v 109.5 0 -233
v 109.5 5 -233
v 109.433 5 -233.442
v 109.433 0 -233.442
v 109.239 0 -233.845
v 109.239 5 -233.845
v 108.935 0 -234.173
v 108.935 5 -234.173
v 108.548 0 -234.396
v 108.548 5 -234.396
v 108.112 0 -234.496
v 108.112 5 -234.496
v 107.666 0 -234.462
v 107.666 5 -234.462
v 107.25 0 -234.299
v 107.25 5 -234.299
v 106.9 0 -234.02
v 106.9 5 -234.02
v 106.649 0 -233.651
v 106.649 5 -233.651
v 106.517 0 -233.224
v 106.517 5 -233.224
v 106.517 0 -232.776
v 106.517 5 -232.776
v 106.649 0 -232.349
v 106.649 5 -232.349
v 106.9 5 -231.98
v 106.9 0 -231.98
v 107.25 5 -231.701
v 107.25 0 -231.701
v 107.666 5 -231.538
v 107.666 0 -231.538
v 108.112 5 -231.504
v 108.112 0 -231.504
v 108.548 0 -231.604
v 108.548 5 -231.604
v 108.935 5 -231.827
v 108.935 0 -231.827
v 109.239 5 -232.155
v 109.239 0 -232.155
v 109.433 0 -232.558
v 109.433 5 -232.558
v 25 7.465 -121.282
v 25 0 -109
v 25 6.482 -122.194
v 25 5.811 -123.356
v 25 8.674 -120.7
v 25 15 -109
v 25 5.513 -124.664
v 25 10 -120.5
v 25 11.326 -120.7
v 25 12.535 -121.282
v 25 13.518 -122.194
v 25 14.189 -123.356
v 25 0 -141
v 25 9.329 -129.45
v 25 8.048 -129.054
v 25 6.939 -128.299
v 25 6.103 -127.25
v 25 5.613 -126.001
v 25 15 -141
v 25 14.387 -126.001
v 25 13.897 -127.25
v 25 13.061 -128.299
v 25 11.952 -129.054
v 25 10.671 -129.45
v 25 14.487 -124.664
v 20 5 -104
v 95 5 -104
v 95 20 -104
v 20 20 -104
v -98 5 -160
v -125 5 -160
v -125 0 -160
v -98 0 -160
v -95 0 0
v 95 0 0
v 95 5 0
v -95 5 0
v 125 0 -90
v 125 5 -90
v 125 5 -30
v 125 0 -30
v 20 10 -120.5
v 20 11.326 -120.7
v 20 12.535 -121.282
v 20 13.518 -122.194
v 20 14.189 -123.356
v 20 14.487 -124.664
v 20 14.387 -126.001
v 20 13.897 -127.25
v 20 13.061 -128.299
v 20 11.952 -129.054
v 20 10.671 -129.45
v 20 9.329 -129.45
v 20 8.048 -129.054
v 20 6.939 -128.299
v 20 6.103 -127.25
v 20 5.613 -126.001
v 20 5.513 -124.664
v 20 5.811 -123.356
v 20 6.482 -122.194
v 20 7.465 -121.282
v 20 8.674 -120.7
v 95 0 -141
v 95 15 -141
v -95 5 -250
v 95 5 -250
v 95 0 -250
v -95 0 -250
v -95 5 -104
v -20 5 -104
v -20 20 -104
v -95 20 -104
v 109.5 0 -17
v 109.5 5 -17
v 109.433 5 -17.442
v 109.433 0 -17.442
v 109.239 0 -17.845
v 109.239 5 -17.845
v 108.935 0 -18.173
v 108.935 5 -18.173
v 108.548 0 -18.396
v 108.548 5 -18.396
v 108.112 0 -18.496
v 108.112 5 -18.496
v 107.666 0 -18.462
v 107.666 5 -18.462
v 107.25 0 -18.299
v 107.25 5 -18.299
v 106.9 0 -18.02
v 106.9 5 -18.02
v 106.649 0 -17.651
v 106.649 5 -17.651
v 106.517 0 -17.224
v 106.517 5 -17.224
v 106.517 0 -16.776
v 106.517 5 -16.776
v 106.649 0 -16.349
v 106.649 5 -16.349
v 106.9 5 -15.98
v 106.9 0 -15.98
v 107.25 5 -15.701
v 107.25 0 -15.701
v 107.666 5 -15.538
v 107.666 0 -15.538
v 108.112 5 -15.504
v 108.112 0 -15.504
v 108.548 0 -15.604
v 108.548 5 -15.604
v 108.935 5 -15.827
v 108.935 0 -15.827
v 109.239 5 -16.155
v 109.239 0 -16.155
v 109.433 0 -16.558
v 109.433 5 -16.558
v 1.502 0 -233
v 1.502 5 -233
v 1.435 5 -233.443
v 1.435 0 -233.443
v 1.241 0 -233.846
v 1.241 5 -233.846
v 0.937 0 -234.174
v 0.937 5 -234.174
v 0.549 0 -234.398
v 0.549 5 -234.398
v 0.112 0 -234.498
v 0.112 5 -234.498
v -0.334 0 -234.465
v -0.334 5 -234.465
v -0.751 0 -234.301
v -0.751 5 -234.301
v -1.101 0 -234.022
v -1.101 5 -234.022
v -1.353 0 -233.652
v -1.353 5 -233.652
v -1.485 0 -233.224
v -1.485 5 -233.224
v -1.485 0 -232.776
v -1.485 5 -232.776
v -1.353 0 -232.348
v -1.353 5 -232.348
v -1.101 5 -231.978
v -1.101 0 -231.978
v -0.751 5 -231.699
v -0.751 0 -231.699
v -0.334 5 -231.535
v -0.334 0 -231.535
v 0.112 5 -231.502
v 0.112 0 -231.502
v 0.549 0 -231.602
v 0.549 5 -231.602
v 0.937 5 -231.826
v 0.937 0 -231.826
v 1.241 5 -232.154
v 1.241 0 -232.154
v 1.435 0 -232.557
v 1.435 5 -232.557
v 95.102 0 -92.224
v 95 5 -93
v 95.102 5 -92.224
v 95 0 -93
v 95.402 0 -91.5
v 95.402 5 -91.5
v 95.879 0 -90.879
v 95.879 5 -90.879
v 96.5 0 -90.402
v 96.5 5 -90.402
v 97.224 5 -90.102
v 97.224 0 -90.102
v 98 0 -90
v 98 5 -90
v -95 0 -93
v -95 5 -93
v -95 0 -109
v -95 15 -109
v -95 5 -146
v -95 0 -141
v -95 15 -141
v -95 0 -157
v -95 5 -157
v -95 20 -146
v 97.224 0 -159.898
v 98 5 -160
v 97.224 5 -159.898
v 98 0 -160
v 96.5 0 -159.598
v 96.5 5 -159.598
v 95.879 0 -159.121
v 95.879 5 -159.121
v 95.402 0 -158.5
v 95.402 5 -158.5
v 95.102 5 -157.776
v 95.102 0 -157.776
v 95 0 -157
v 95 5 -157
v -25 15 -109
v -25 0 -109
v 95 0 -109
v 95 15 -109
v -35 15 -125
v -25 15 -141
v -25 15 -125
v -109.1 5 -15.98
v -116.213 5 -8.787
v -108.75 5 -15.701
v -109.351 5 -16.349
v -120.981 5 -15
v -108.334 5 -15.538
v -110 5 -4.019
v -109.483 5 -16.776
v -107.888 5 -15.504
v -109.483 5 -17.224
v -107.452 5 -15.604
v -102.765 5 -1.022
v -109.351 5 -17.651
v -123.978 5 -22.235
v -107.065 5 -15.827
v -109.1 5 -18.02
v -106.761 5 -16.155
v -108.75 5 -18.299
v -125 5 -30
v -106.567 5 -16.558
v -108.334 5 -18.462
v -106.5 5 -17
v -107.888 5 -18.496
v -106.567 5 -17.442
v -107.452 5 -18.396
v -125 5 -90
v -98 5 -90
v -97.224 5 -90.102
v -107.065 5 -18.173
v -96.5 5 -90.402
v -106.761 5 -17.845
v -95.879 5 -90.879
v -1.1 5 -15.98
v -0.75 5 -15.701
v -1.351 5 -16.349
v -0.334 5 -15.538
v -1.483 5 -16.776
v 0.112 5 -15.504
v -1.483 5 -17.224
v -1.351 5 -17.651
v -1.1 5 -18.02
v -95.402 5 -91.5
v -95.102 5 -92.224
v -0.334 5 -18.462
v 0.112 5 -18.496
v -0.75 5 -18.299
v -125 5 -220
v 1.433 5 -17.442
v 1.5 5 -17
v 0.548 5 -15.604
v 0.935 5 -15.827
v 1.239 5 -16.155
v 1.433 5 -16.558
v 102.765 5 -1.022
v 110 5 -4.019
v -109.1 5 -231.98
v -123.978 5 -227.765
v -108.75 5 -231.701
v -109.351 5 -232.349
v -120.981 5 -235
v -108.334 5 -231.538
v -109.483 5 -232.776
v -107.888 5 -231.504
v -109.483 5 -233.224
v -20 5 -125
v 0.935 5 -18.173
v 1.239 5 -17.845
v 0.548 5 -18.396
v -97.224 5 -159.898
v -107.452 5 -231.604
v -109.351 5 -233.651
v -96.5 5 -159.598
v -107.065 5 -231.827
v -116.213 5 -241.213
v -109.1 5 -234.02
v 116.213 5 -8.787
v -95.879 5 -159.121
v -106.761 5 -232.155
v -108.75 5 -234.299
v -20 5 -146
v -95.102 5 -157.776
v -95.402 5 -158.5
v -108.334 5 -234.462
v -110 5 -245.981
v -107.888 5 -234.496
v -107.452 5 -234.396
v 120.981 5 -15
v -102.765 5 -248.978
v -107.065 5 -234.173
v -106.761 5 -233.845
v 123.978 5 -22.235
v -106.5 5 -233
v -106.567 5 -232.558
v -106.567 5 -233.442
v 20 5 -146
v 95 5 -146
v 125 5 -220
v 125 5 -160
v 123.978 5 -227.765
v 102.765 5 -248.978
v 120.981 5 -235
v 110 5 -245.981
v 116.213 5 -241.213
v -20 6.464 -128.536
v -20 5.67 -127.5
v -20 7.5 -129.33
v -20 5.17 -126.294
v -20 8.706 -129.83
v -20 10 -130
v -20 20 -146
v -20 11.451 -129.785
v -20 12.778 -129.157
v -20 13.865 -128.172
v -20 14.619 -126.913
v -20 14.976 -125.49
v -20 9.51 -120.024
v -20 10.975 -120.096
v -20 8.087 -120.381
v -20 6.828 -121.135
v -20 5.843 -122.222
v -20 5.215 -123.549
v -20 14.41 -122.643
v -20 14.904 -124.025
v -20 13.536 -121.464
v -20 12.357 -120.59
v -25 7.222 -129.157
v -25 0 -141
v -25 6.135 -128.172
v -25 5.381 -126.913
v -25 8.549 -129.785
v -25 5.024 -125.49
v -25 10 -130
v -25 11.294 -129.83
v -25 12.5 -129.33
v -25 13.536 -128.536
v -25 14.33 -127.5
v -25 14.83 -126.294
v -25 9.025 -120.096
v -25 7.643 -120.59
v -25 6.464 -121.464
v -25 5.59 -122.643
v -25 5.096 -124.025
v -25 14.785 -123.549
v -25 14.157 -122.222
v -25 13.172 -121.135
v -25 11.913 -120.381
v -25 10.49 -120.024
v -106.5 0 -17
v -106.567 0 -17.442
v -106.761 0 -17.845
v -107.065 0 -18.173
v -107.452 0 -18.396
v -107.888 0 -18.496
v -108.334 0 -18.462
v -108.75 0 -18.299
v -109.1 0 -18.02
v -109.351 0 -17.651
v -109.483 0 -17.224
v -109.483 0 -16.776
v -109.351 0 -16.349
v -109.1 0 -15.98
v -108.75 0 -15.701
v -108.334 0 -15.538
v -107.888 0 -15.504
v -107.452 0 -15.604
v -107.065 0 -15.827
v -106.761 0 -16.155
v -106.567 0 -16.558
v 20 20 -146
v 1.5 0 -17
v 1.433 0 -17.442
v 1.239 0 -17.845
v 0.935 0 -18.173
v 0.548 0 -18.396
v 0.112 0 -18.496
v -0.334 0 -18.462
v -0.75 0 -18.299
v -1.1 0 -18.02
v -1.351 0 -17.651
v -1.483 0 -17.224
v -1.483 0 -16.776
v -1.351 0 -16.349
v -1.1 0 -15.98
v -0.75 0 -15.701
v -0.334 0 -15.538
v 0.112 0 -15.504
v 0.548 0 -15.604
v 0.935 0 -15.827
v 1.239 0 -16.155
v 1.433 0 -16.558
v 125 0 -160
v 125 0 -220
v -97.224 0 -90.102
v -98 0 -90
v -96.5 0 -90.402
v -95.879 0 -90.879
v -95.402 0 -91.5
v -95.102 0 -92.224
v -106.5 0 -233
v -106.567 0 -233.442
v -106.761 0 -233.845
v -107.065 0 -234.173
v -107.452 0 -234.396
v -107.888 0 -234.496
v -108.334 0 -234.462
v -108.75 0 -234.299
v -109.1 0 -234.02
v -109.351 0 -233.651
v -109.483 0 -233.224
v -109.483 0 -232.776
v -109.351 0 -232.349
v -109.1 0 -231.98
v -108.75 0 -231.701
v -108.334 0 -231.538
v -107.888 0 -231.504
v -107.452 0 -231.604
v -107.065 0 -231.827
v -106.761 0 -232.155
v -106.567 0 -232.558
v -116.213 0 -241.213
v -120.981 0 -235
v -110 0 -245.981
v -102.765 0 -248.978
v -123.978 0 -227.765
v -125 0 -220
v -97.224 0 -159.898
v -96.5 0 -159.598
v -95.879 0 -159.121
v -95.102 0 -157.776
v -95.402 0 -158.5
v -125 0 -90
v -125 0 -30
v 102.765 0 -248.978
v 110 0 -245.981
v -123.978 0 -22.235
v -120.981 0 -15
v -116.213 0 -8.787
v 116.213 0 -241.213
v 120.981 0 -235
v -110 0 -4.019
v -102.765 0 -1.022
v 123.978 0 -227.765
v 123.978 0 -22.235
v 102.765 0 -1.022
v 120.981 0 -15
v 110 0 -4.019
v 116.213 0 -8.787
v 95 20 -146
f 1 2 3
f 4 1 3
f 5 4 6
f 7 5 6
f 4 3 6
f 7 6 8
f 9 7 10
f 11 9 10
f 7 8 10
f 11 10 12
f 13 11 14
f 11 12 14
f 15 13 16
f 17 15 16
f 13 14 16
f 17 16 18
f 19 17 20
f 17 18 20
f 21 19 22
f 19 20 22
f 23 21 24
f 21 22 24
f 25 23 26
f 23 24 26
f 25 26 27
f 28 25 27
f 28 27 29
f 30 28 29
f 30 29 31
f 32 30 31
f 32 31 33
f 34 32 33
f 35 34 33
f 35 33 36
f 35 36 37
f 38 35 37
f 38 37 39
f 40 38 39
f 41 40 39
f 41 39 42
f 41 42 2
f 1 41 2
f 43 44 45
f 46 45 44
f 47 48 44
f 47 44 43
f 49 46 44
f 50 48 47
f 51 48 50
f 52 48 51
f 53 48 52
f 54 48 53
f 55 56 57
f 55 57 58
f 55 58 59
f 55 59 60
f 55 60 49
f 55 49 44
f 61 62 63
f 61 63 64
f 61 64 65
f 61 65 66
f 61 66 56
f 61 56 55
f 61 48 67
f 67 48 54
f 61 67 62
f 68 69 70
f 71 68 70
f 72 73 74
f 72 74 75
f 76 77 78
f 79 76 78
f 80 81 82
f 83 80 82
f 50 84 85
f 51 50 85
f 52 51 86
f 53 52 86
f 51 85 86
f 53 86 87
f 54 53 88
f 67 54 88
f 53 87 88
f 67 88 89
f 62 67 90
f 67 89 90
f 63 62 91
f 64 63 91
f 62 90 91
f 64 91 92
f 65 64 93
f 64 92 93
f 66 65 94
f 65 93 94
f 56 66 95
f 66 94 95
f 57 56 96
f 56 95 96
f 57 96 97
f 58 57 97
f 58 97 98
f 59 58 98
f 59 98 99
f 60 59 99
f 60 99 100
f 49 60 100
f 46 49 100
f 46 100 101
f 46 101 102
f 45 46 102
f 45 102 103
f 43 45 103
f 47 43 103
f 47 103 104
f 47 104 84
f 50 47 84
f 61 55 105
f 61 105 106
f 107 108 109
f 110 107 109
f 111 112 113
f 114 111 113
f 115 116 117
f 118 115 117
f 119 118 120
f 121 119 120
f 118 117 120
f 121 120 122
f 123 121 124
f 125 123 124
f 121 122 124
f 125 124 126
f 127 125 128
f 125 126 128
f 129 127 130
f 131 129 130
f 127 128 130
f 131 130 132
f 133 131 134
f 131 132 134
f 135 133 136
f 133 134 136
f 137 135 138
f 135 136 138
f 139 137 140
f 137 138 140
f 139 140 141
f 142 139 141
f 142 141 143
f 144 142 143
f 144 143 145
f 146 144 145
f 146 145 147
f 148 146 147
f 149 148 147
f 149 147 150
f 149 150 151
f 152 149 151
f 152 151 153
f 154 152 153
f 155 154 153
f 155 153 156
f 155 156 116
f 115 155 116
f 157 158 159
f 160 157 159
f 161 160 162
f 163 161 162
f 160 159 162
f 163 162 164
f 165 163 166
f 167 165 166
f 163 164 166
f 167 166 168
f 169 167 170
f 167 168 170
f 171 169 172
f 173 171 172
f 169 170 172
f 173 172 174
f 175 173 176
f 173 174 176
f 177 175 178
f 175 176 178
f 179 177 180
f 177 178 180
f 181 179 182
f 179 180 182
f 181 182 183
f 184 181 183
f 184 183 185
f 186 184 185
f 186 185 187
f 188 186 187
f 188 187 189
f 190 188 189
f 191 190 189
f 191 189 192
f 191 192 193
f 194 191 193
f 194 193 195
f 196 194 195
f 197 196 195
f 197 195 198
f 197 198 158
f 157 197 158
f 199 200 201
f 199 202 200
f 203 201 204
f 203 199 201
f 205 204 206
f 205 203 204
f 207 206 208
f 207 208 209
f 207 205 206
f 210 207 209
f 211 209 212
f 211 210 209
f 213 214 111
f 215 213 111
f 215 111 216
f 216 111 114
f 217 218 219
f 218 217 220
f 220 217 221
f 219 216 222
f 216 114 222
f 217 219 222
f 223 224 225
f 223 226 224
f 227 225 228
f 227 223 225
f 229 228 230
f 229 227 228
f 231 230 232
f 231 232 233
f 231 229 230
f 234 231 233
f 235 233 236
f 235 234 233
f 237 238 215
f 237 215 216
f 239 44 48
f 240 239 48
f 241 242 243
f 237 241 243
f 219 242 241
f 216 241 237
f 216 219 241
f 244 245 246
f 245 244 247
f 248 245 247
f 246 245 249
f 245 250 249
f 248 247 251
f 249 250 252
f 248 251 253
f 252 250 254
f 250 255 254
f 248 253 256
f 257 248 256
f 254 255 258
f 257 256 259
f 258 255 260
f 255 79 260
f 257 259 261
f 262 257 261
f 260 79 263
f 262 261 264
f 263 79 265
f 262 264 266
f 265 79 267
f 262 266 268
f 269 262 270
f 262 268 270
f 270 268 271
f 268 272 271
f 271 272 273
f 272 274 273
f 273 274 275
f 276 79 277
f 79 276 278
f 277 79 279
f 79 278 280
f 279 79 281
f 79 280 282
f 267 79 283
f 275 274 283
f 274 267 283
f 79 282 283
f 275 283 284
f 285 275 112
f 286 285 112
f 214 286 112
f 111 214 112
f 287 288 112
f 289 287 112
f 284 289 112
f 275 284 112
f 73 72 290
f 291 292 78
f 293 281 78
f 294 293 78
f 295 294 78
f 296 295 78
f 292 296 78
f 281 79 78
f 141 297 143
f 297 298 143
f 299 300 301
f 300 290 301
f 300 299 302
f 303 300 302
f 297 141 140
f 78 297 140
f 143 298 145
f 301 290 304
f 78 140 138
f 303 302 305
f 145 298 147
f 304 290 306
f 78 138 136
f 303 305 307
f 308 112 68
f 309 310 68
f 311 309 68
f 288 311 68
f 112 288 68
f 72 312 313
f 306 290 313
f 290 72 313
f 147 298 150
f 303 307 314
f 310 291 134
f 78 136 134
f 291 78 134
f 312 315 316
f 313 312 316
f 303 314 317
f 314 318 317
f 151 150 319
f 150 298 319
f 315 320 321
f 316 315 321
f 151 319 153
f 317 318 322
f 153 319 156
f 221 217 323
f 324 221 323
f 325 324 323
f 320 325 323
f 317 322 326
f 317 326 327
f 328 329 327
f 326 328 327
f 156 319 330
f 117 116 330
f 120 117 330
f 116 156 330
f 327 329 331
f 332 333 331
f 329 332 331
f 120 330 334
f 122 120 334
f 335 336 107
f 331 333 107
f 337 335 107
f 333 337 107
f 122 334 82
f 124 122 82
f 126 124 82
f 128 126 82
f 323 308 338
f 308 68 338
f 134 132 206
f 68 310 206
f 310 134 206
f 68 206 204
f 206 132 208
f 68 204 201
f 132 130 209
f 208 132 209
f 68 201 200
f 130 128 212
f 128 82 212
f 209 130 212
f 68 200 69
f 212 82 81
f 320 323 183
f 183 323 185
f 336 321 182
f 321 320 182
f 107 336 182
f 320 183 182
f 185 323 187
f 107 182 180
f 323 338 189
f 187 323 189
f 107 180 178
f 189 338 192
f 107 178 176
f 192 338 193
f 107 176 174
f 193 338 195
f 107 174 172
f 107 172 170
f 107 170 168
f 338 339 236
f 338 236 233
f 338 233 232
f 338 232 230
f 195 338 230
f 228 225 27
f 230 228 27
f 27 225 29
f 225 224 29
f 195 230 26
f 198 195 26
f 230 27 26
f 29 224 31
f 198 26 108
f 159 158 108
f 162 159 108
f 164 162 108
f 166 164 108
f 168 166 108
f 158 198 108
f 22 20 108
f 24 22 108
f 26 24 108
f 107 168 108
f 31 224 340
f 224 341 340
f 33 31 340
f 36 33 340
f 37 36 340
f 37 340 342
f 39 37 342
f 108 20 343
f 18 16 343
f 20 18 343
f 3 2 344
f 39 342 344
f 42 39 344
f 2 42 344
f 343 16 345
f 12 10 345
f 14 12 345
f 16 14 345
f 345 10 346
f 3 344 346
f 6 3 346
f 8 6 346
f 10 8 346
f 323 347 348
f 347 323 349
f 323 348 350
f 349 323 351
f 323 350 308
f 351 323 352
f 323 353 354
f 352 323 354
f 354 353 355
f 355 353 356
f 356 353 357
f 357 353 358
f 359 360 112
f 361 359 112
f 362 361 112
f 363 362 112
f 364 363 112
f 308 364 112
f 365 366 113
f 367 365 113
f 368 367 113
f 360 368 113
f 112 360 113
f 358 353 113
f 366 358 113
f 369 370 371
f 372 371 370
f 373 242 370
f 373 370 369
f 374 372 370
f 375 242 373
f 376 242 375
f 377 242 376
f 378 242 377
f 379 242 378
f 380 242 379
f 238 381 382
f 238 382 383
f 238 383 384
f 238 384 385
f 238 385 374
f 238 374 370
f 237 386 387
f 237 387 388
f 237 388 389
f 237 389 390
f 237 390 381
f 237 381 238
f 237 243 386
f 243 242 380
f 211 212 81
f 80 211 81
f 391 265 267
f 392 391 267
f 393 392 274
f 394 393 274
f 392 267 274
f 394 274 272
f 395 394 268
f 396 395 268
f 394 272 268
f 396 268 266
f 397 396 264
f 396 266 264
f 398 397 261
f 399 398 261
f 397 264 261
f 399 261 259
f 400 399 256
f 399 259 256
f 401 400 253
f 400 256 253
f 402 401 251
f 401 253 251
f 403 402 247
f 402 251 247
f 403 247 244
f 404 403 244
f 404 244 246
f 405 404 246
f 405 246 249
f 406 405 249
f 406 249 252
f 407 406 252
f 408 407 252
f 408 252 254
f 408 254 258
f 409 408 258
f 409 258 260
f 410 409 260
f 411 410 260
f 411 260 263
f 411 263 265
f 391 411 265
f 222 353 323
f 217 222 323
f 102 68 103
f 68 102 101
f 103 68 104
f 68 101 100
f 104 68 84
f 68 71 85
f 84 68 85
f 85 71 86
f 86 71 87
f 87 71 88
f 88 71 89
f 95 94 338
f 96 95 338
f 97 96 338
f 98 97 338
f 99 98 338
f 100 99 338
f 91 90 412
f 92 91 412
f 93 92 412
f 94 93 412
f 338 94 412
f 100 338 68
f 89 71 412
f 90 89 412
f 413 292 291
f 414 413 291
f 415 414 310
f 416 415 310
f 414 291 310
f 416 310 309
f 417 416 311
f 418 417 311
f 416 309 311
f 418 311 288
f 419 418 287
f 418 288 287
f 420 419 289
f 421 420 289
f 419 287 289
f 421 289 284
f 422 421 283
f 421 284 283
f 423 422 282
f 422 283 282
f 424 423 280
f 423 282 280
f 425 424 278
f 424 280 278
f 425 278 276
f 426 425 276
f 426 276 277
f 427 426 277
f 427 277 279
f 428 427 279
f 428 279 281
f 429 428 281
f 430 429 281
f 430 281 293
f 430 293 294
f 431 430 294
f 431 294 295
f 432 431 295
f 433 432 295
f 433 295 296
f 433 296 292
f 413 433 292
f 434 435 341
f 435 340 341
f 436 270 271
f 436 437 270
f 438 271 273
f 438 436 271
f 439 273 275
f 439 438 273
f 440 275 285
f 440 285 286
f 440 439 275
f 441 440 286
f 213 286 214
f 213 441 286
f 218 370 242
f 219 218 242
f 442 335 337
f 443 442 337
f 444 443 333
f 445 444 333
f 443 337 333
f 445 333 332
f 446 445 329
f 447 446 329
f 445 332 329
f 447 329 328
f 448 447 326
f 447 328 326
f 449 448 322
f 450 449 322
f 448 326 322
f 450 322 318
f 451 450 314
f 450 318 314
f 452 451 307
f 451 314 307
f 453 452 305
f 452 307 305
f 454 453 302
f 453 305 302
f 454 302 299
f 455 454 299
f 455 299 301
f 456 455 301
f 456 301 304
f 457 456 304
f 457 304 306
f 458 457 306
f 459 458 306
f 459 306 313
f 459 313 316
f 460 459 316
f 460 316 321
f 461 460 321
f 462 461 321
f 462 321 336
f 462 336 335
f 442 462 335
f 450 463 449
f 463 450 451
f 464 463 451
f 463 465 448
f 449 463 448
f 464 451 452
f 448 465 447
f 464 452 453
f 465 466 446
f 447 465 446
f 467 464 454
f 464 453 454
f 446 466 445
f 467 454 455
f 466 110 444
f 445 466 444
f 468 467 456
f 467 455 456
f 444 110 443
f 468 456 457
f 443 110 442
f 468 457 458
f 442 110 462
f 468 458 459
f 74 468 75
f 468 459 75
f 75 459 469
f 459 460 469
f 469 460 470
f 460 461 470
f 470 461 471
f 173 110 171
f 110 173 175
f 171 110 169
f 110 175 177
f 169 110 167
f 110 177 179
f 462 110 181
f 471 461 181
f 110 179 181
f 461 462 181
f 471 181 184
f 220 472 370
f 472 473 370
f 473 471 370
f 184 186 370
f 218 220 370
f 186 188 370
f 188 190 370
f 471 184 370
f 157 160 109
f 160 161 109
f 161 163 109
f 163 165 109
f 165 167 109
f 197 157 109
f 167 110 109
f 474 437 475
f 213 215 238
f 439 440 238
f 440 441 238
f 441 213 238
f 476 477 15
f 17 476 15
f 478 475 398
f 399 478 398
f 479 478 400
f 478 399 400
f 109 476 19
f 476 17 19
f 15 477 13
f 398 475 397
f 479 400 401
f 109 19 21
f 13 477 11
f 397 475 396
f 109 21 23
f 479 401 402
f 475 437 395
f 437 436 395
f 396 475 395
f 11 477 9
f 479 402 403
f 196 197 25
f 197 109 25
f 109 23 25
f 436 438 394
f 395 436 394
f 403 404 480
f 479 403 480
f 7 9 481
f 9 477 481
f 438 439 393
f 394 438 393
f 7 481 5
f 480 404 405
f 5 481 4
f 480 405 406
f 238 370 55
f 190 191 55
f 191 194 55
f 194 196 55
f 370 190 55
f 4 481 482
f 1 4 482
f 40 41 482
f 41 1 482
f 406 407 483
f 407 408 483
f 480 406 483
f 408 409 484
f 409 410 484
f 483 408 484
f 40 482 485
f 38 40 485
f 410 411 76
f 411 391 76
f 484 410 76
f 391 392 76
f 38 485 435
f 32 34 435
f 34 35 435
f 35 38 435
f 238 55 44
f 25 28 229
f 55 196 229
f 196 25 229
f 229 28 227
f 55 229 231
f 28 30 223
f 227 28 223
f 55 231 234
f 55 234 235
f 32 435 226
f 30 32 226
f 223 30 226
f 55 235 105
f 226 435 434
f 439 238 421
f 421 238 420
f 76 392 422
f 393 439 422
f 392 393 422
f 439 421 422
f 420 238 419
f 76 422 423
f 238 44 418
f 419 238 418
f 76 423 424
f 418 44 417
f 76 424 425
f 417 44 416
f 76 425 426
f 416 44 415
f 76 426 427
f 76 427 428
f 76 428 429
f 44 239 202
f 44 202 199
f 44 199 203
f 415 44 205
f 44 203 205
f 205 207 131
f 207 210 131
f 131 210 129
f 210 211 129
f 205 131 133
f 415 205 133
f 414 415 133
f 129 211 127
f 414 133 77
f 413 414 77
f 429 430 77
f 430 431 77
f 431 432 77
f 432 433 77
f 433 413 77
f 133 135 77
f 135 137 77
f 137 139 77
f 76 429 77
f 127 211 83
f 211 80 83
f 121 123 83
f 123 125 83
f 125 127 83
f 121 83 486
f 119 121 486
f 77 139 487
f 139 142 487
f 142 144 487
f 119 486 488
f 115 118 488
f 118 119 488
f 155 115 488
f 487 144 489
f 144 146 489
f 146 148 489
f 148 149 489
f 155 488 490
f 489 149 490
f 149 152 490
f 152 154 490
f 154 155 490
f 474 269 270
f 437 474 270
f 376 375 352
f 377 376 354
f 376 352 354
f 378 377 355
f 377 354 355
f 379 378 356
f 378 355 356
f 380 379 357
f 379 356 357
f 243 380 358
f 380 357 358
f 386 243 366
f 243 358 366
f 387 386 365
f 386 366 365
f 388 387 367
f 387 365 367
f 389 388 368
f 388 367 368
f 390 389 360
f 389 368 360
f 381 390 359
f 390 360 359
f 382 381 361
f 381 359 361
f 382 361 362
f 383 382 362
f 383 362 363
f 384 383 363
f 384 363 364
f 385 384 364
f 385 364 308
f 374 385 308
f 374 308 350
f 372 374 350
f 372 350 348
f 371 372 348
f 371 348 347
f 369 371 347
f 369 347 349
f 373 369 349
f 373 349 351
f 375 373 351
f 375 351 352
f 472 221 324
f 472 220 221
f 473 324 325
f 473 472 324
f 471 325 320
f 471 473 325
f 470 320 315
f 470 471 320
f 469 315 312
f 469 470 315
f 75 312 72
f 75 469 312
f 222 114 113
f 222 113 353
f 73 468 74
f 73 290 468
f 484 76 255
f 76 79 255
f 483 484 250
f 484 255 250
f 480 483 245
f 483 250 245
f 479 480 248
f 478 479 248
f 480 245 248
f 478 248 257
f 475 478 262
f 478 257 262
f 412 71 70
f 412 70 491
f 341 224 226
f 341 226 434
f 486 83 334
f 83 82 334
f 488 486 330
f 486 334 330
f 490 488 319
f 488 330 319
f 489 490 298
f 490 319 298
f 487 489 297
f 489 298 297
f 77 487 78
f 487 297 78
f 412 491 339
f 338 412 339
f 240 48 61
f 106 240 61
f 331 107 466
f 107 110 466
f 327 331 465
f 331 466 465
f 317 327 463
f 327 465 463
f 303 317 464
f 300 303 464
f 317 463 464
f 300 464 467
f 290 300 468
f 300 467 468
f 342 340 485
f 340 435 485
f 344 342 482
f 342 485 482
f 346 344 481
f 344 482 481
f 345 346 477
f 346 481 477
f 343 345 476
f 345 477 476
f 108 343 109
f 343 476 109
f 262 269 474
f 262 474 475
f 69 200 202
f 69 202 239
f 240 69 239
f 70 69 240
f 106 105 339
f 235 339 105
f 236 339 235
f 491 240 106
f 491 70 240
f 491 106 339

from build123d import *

# Parameters (mm, degrees)
BOSS_EXTRUDE1_DEPTH = 125
SKETCH4_W           = 32
SKETCH4_H           = 15
CUT_EXTRUDE1_DEPTH  = 100
SKETCH5_W           = 32
SKETCH5_H           = 15
CUT_EXTRUDE2_DEPTH  = 100
CUT_EXTRUDE3_REACH  = 22
SKETCH6_W           = 30
SKETCH6_H           = 70
CUT_EXTRUDE4_DEPTH  = 15
SKETCH8_R           = 4.5
CUT_EXTRUDE5_DEPTH  = 15
SKETCH9_R           = 5
CUT_EXTRUDE6_DEPTH  = 15
FILLET1_R           = 3
FILLET2_R           = 30
CUT_EXTRUDE7_REACH  = 7
SKETCH11_R          = 1.5
SKETCH11_R_2        = 1.502187573


with BuildPart() as part:
    # Sketch3 → Boss-Extrude1 (new body, symmetric)
    with BuildSketch(Plane(origin=(0, 0, 0), x_dir=(0, 0, -1), z_dir=(1, 0, 0))):
        Polygon((0, 0), (0, 5), (104, 5), (104, 20), (146, 20), (146, 5), (250, 5), (250, 0), align=None)
    extrude(amount=BOSS_EXTRUDE1_DEPTH, both=True)

    # Sketch4 → Cut-Extrude1 (cut)
    with BuildSketch(Plane(origin=(125, 0, 0), x_dir=(0, 0, -1), z_dir=(1, 0, 0))):
        with Locations((125, 7.5)):
            Rectangle(SKETCH4_W, SKETCH4_H)
    extrude(amount=-CUT_EXTRUDE1_DEPTH, mode=Mode.SUBTRACT)

    # Sketch5 → Cut-Extrude2 (cut)
    with BuildSketch(Plane.ZY.offset(125)):
        with Locations((-125, 7.5)):
            Rectangle(SKETCH5_W, SKETCH5_H)
    extrude(amount=-CUT_EXTRUDE2_DEPTH, mode=Mode.SUBTRACT)

    # Sketch6 → Cut-Extrude3 (cut, up to next)
    with BuildSketch(Plane(origin=(0, 20, 0), x_dir=(1, 0, 0), z_dir=(0, 1, 0)), mode=Mode.PRIVATE) as cut_extrude3_sk1:
        with Locations((-110, 125)):
            Rectangle(SKETCH6_W, SKETCH6_H)
    cut_extrude3_tool1 = extrude(cut_extrude3_sk1.sketch, amount=-CUT_EXTRUDE3_REACH, mode=Mode.PRIVATE) & part.part
    add(cut_extrude3_tool1.solids().sort_by_distance((-110, 20, -125))[0], mode=Mode.SUBTRACT)
    # Sketch6 → Cut-Extrude3 (cut, up to next)
    with BuildSketch(Plane(origin=(0, 20, 0), x_dir=(1, 0, 0), z_dir=(0, 1, 0)), mode=Mode.PRIVATE) as cut_extrude3_sk2:
        with Locations((110, 125)):
            Rectangle(SKETCH6_W, SKETCH6_H)
    cut_extrude3_tool2 = extrude(cut_extrude3_sk2.sketch, amount=-CUT_EXTRUDE3_REACH, mode=Mode.PRIVATE) & part.part
    add(cut_extrude3_tool2.solids().sort_by_distance((110, 20, -125))[0], mode=Mode.SUBTRACT)

    # Sketch7 → Cut-Extrude4 (cut)
    with BuildSketch(Plane(origin=(0, 20, 0), x_dir=(1, 0, 0), z_dir=(0, 1, 0))):
        Polygon((0, 146), (-20, 146), (-20, 104), (0, 104), (20, 104), (20, 146), align=None)
    extrude(amount=-CUT_EXTRUDE4_DEPTH, mode=Mode.SUBTRACT)

    # Sketch8 → Cut-Extrude5 (cut)
    with BuildSketch(Plane.ZY.offset(-20)):
        with Locations((-125, 10)):
            Circle(SKETCH8_R)
    extrude(amount=-CUT_EXTRUDE5_DEPTH, mode=Mode.SUBTRACT)

    # Sketch9 → Cut-Extrude6 (cut)
    with BuildSketch(Plane(origin=(-20, 0, 0), x_dir=(0, 0, -1), z_dir=(1, 0, 0))):
        with Locations((125, 10)):
            Circle(SKETCH9_R)
    extrude(amount=-CUT_EXTRUDE6_DEPTH, mode=Mode.SUBTRACT)

    # Fillet1
    fillet1_edges = [part.edges().sort_by_distance(p)[0] for p in [
        (-95, 2.5, -90),
        (-95, 2.5, -160),
        (95, 2.5, -160),
        (95, 2.5, -90),
    ]]
    fillet(fillet1_edges, radius=FILLET1_R)

    # Fillet2
    fillet2_edges = [part.edges().sort_by_distance(p)[0] for p in [
        (-125, 2.5, -250),
        (125, 2.5, 0),
        (-125, 2.5, 0),
        (125, 2.5, -250),
    ]]
    fillet(fillet2_edges, radius=FILLET2_R)

    # Sketch11 → Cut-Extrude7 (cut, up to next)
    with BuildSketch(Plane(origin=(0, 5, 0), x_dir=(1, 0, 0), z_dir=(0, 1, 0)), mode=Mode.PRIVATE) as cut_extrude7_sk1:
        with Locations((-108, 233)):
            Circle(SKETCH11_R)
    cut_extrude7_tool1 = extrude(cut_extrude7_sk1.sketch, amount=-CUT_EXTRUDE7_REACH, mode=Mode.PRIVATE) & part.part
    add(cut_extrude7_tool1.solids().sort_by_distance((-108, 5, -233))[0], mode=Mode.SUBTRACT)
    # Sketch11 → Cut-Extrude7 (cut, up to next)
    with BuildSketch(Plane(origin=(0, 5, 0), x_dir=(1, 0, 0), z_dir=(0, 1, 0)), mode=Mode.PRIVATE) as cut_extrude7_sk2:
        with Locations((108, 233)):
            Circle(SKETCH11_R)
    cut_extrude7_tool2 = extrude(cut_extrude7_sk2.sketch, amount=-CUT_EXTRUDE7_REACH, mode=Mode.PRIVATE) & part.part
    add(cut_extrude7_tool2.solids().sort_by_distance((108, 5, -233))[0], mode=Mode.SUBTRACT)
    # Sketch11 → Cut-Extrude7 (cut, up to next)
    with BuildSketch(Plane(origin=(0, 5, 0), x_dir=(1, 0, 0), z_dir=(0, 1, 0)), mode=Mode.PRIVATE) as cut_extrude7_sk3:
        with Locations((108, 17)):
            Circle(SKETCH11_R)
    cut_extrude7_tool3 = extrude(cut_extrude7_sk3.sketch, amount=-CUT_EXTRUDE7_REACH, mode=Mode.PRIVATE) & part.part
    add(cut_extrude7_tool3.solids().sort_by_distance((108, 5, -17))[0], mode=Mode.SUBTRACT)
    # Sketch11 → Cut-Extrude7 (cut, up to next)
    with BuildSketch(Plane(origin=(0, 5, 0), x_dir=(1, 0, 0), z_dir=(0, 1, 0)), mode=Mode.PRIVATE) as cut_extrude7_sk4:
        with Locations((-108, 17)):
            Circle(SKETCH11_R)
    cut_extrude7_tool4 = extrude(cut_extrude7_sk4.sketch, amount=-CUT_EXTRUDE7_REACH, mode=Mode.PRIVATE) & part.part
    add(cut_extrude7_tool4.solids().sort_by_distance((-108, 5, -17))[0], mode=Mode.SUBTRACT)
    # Sketch11 → Cut-Extrude7 (cut, up to next)
    with BuildSketch(Plane(origin=(0, 5, 0), x_dir=(1, 0, 0), z_dir=(0, 1, 0)), mode=Mode.PRIVATE) as cut_extrude7_sk5:
        with Locations((0, 17)):
            Circle(SKETCH11_R)
    cut_extrude7_tool5 = extrude(cut_extrude7_sk5.sketch, amount=-CUT_EXTRUDE7_REACH, mode=Mode.PRIVATE) & part.part
    add(cut_extrude7_tool5.solids().sort_by_distance((0, 5, -17))[0], mode=Mode.SUBTRACT)
    # Sketch11 → Cut-Extrude7 (cut, up to next)
    with BuildSketch(Plane(origin=(0, 5, 0), x_dir=(1, 0, 0), z_dir=(0, 1, 0)), mode=Mode.PRIVATE) as cut_extrude7_sk6:
        with Locations((0, 233)):
            Circle(SKETCH11_R_2)
    cut_extrude7_tool6 = extrude(cut_extrude7_sk6.sketch, amount=-CUT_EXTRUDE7_REACH, mode=Mode.PRIVATE) & part.part
    add(cut_extrude7_tool6.solids().sort_by_distance((0, 5, -233))[0], mode=Mode.SUBTRACT)


solid = part.part
